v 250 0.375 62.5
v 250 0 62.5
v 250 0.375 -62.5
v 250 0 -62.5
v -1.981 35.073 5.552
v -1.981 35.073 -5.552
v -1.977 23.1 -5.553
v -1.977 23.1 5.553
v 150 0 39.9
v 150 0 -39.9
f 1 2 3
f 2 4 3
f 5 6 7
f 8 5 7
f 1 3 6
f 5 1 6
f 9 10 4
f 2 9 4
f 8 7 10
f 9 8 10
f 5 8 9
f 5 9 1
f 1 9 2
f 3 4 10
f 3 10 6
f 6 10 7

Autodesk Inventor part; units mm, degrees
sketch "Sketch_4" plane through (0, 0, 0) normal (0, 0, 1) x (1, 0, 0)
  line L0 (-1.9813, 35.0728) -> (-1.9773, 23.1005)
  line L1 (-1.9773, 23.1005) -> (150, 0)
  line L2 (150, 0) -> (250, 0)
  line L3 (250, 0) -> (250, 0.375)
  line L4 (250, 0.375) -> (-1.9813, 35.0728)
extrude "Extrusion1" add sketch "Sketch_4" along normal mid plane 129
sketch "Sketch_5" plane through (0, 0, 0) normal (0, 1, 0) x (-1, 0, 0)
  line L0 (5, 131) -> (-260, 131)
  line L1 (-260, 131) -> (-260, -131)
  line L2 (-260, -131) -> (5, -131)
  line L3 (5, -131) -> (5, 131)
  line L4 (2.9262, 5.3387) -> (-250, 62.5)
  line L5 (-250, 62.5) -> (-250, -62.5)
  line L6 (-250, -62.5) -> (2.9262, -5.3387)
  line L7 (2.9262, -5.3387) -> (2.9262, 5.3387)
extrude "Extrusion2" cut sketch "Sketch_5" along normal mid plane 91.6
ref_plane "CP1_XY" through (0, 0, 0) normal (0, 0, 1) x (1, 0, 0)
ref_plane "CP1_YZ" through (0, 0, 0) normal (1, 0, 0) x (0, 1, 0)
ref_plane "CP1_ZX" through (0, 0, 0) normal (0, 1, 0) x (0, 0, 1)
properties part number "Receivingbeam_OXS200_11728845"
